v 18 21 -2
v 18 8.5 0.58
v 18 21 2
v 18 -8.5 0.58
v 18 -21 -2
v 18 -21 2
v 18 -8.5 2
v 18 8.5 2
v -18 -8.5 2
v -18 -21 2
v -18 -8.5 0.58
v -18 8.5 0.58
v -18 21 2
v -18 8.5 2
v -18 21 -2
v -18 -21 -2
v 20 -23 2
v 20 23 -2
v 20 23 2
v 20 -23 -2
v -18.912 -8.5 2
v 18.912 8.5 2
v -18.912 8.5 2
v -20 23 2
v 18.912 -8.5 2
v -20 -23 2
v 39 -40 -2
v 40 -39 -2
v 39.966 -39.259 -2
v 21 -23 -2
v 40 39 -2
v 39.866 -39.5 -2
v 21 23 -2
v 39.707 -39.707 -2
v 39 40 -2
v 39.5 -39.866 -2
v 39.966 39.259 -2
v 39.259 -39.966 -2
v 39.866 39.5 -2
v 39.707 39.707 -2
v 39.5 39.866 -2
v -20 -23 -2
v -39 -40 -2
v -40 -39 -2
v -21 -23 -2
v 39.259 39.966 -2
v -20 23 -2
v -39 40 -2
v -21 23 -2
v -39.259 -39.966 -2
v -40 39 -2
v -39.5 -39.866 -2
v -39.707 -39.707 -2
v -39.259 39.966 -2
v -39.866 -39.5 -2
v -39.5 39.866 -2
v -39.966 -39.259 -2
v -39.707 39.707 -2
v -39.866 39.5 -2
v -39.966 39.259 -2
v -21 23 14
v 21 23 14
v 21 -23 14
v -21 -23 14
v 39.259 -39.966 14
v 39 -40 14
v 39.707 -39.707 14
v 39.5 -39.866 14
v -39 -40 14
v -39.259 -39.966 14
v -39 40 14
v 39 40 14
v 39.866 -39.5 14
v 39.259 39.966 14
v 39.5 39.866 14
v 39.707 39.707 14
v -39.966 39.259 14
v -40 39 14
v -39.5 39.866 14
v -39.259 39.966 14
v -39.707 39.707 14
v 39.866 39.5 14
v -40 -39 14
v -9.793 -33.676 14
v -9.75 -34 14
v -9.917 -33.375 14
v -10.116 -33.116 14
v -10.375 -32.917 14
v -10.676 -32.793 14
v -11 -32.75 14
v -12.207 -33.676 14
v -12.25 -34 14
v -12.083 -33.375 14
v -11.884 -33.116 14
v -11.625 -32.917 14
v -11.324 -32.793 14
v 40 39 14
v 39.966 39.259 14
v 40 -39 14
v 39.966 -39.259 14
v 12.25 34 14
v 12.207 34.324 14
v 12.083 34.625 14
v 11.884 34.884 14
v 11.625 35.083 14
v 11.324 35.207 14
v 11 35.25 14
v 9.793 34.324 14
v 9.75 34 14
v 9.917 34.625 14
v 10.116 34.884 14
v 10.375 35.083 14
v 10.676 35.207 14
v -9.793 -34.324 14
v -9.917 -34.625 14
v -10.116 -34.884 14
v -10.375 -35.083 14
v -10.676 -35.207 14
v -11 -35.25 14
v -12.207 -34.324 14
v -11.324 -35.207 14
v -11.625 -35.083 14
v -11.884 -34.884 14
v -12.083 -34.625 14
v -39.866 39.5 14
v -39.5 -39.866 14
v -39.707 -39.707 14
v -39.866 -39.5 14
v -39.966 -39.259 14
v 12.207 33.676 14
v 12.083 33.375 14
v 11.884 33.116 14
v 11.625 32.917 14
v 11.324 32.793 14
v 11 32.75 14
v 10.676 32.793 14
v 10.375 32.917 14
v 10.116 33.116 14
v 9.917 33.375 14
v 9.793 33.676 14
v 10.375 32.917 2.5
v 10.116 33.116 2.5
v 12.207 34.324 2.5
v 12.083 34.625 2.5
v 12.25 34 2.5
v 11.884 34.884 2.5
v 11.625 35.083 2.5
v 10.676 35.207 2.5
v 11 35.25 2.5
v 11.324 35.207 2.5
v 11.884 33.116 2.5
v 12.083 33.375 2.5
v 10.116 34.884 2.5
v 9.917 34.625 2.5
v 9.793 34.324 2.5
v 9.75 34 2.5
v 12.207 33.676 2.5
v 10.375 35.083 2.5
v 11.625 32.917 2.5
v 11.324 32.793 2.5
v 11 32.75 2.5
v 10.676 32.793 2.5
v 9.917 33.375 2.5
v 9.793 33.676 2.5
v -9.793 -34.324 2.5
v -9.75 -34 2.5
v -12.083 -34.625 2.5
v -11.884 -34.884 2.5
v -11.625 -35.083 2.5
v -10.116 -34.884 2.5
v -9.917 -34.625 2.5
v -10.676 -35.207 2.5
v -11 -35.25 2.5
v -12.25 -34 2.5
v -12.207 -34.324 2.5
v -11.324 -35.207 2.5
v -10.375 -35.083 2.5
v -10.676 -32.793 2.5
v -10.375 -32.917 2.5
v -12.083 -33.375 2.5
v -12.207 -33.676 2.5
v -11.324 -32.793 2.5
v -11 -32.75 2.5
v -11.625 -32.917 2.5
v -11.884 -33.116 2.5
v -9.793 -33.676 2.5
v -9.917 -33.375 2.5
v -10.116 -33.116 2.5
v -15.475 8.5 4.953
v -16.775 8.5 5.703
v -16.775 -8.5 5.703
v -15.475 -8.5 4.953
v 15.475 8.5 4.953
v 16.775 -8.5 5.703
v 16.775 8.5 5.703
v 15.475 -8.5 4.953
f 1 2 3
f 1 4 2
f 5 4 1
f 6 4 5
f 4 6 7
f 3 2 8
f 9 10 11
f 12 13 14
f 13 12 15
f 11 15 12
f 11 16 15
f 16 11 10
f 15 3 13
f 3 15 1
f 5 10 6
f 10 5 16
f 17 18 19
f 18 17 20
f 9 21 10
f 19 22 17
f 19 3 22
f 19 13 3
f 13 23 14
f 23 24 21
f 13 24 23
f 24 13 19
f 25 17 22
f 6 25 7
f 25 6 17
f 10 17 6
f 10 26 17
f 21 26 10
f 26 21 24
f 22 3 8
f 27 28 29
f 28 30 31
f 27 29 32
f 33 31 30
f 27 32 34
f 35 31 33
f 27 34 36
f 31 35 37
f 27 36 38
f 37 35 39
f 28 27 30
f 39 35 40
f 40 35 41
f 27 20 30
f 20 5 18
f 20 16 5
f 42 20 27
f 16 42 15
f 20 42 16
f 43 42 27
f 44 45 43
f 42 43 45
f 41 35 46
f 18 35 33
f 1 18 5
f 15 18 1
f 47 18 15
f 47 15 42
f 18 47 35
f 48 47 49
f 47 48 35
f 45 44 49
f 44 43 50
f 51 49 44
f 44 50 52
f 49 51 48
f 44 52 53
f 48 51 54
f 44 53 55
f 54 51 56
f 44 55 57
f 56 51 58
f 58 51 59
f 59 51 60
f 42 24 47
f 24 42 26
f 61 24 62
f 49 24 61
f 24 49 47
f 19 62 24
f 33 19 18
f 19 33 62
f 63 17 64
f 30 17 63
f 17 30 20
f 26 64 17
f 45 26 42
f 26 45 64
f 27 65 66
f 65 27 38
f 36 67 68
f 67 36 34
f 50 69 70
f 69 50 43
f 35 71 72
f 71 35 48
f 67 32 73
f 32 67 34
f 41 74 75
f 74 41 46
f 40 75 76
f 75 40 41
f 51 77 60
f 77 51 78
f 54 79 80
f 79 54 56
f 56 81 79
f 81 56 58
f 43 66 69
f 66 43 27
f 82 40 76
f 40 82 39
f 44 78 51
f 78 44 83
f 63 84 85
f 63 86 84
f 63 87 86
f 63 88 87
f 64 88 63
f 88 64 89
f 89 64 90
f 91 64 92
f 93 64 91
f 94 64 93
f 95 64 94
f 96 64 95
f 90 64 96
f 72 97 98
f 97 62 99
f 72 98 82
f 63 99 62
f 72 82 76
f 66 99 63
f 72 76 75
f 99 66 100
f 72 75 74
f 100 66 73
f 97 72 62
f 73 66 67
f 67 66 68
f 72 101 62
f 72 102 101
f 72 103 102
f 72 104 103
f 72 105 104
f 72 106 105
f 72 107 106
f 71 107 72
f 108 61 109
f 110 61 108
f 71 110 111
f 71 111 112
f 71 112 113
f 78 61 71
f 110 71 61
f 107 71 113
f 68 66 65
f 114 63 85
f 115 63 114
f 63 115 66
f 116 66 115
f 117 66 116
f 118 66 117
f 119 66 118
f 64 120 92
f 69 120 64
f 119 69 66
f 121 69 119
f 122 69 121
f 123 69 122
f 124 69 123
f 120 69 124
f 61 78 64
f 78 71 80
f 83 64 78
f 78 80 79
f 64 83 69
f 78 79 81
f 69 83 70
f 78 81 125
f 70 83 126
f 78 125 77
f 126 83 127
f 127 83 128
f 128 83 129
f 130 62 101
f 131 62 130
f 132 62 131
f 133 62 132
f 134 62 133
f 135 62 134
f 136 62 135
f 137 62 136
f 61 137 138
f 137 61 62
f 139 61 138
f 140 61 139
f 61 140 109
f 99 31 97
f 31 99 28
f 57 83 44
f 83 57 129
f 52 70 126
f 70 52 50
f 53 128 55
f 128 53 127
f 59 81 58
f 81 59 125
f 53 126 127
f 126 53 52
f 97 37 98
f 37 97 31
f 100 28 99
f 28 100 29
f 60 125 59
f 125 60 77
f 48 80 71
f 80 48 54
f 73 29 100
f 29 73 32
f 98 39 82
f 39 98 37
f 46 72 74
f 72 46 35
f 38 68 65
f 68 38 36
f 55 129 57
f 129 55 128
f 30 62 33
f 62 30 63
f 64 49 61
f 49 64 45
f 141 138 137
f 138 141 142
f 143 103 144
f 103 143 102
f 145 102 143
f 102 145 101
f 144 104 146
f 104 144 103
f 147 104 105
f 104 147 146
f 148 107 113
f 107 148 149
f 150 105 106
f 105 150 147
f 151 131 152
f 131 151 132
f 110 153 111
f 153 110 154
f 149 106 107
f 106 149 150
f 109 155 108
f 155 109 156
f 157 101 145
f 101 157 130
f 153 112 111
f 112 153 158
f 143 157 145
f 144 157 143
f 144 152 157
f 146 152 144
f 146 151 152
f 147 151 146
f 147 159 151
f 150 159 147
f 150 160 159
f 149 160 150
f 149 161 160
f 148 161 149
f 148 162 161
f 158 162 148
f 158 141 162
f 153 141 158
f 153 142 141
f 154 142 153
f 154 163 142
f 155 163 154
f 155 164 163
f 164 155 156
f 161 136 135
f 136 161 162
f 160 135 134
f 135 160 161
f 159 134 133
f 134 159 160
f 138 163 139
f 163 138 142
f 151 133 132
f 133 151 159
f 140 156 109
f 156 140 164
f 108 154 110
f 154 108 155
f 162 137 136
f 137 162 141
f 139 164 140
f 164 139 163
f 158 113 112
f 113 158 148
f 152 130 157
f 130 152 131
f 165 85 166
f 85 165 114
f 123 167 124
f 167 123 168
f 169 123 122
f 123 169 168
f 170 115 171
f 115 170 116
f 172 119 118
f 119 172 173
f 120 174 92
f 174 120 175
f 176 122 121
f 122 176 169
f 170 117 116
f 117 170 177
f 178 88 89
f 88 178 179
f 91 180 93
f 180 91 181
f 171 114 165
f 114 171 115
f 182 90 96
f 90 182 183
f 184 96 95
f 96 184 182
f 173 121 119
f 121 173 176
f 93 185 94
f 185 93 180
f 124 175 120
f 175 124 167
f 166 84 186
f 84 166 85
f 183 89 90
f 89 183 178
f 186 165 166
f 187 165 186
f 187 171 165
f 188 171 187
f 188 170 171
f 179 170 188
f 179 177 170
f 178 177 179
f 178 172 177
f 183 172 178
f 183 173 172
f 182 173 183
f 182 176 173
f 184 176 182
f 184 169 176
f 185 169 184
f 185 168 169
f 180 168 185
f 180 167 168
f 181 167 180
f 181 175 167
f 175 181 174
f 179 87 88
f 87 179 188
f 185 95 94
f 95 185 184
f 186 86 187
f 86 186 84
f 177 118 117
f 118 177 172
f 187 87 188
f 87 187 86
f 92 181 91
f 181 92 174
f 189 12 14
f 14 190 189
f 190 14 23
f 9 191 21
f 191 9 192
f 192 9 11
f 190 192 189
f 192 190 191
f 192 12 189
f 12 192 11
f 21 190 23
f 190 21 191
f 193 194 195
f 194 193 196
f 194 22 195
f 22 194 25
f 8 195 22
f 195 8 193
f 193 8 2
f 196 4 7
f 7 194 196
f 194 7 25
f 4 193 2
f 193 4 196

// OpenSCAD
$fn = 24;


// switch base
module switch_base(){
	translate([0,0,-1])
	cube([36,42,4.01],center = true);
	translate([0,0,(11/2)+1])
	cube([36,24,11],center = true);
}

difference(){
	cube([40,46,4], center=true);
	translate([0,0,1])
	switch_base();
}

//color("red") import("Cotech.stl");

module clip(){
	color("blue")
	translate([-17.7,0,2.6])
	rotate([0,30,0])
	cube([1.5,17,6.3], center=true);
}
translate([0,0,0])
clip();
rotate([0,0,180])
clip();


translate([0,0,(16/2)-2])
difference(){
	minkowski(){
		cube([78,78,15],center=true);
		cylinder(1,center=true);
	}
	cube([42,46,16.01],center=true);
	translate([11,34,(16/2)-2])
	cylinder(h=19,r=(2.5/2),center=true);
	rotate([0,0,180])
	translate([11,34,(16/2)-2])
	cylinder(h=19,r=(2.5/2),center=true);
}

//translate([11,34,(16/2)-2]) cylinder(h=16,r=(2.5/2),center=true);
